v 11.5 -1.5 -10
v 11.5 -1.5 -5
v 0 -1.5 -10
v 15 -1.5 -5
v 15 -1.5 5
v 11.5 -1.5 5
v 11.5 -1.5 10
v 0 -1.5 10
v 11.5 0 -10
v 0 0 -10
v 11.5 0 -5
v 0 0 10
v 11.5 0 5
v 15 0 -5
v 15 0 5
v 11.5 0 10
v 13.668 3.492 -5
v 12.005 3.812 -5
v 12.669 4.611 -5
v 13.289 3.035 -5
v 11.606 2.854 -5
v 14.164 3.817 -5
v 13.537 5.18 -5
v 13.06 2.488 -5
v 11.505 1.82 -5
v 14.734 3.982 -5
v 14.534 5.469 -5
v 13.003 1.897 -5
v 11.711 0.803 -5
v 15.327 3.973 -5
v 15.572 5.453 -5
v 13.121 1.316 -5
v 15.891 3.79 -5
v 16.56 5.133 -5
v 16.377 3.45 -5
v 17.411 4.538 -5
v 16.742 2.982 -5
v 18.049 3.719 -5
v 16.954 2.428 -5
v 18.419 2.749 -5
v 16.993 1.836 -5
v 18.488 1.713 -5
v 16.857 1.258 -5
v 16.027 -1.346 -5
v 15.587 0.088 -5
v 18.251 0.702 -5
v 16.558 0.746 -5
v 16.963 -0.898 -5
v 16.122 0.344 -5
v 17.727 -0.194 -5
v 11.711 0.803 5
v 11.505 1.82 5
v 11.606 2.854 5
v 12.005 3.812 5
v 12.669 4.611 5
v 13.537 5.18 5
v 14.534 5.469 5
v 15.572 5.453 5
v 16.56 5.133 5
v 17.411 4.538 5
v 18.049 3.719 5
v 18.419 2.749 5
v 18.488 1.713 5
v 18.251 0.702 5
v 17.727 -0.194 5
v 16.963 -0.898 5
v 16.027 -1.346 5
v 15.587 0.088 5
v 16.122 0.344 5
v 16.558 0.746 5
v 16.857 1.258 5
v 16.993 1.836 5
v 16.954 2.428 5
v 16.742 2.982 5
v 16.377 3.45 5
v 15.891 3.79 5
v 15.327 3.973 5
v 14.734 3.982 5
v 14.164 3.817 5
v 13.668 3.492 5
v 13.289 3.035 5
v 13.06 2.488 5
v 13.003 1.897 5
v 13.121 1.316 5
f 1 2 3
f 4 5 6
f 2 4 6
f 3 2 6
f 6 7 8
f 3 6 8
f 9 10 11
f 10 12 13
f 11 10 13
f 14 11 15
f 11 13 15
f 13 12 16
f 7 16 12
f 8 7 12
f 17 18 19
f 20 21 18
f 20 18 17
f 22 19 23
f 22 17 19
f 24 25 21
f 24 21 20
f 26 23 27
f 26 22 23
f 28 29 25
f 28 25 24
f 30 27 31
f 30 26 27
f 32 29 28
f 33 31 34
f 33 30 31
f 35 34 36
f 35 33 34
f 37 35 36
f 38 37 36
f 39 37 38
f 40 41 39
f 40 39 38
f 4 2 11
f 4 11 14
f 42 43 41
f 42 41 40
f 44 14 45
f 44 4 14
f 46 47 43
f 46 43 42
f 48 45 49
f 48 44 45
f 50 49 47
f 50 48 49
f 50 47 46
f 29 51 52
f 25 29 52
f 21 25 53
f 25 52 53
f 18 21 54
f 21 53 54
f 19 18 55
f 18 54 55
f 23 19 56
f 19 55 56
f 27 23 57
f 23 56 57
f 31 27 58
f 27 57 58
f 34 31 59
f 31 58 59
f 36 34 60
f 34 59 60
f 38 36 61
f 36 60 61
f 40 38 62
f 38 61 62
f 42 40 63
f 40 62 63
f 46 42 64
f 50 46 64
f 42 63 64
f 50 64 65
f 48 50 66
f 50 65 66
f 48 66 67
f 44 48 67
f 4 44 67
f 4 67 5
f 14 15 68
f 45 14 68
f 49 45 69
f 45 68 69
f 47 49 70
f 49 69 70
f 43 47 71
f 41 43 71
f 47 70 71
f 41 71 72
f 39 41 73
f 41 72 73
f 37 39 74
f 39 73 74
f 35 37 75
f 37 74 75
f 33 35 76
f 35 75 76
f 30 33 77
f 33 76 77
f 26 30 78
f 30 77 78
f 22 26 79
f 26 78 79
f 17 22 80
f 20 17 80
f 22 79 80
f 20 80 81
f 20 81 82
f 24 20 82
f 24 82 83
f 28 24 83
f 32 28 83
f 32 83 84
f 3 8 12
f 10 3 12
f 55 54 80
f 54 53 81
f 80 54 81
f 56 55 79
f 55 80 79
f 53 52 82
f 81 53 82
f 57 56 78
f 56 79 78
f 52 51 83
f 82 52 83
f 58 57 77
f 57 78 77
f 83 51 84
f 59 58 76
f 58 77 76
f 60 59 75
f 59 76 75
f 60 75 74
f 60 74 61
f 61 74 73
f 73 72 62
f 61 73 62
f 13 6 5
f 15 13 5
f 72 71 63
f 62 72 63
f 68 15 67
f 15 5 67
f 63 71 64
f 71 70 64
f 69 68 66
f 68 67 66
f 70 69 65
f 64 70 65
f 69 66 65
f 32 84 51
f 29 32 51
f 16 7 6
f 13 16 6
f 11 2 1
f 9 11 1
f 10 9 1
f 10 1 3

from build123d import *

# Parameters (mm, degrees)
BASE_FLANGE1_DEPTH      = 10
CUT_EXTRUDE1_DEPTH      = 22.737065119
CUT_EXTRUDE1_DEPTH_BACK = 22.737065119
SKETCH11_W              = 7
SKETCH11_H              = 5


# Sheet-metal steps are written as plain solids
with BuildPart() as part:
    # Sketch1 → Base-Flange1 (new, symmetric)
    with BuildSketch(Plane.XY):
        with BuildLine():
            Line((0, 0), (15, 0))
            ThreePointArc((15, 0), (16.147152873, 3.638304089), (13.120614758, 1.315959713))
            Line((13.120614758, 1.315959713), (11.711075827, 0.802929498))
            ThreePointArc((11.711075827, 0.802929498), (17.007517527, 4.867032155), (15, -1.5))
            Line((15, -1.5), (0, -1.5))
            Line((0, -1.5), (0, 0))
        make_face()
    extrude(amount=BASE_FLANGE1_DEPTH, both=True)

    # Sketch11 → Cut-Extrude1 (cut, two sides: drawn at the far end of the back side and taken through both)
    with BuildSketch(Plane(origin=(0, 0, 0), x_dir=(1, 0, 0), z_dir=(0, 1, 0)).offset(-CUT_EXTRUDE1_DEPTH_BACK)):
        with Locations((15, 7.5)):
            Rectangle(SKETCH11_W, SKETCH11_H)
        with Locations((15, -7.5)):
            Rectangle(SKETCH11_W, SKETCH11_H)
    extrude(amount=CUT_EXTRUDE1_DEPTH + CUT_EXTRUDE1_DEPTH_BACK, mode=Mode.SUBTRACT)


solid = part.part
